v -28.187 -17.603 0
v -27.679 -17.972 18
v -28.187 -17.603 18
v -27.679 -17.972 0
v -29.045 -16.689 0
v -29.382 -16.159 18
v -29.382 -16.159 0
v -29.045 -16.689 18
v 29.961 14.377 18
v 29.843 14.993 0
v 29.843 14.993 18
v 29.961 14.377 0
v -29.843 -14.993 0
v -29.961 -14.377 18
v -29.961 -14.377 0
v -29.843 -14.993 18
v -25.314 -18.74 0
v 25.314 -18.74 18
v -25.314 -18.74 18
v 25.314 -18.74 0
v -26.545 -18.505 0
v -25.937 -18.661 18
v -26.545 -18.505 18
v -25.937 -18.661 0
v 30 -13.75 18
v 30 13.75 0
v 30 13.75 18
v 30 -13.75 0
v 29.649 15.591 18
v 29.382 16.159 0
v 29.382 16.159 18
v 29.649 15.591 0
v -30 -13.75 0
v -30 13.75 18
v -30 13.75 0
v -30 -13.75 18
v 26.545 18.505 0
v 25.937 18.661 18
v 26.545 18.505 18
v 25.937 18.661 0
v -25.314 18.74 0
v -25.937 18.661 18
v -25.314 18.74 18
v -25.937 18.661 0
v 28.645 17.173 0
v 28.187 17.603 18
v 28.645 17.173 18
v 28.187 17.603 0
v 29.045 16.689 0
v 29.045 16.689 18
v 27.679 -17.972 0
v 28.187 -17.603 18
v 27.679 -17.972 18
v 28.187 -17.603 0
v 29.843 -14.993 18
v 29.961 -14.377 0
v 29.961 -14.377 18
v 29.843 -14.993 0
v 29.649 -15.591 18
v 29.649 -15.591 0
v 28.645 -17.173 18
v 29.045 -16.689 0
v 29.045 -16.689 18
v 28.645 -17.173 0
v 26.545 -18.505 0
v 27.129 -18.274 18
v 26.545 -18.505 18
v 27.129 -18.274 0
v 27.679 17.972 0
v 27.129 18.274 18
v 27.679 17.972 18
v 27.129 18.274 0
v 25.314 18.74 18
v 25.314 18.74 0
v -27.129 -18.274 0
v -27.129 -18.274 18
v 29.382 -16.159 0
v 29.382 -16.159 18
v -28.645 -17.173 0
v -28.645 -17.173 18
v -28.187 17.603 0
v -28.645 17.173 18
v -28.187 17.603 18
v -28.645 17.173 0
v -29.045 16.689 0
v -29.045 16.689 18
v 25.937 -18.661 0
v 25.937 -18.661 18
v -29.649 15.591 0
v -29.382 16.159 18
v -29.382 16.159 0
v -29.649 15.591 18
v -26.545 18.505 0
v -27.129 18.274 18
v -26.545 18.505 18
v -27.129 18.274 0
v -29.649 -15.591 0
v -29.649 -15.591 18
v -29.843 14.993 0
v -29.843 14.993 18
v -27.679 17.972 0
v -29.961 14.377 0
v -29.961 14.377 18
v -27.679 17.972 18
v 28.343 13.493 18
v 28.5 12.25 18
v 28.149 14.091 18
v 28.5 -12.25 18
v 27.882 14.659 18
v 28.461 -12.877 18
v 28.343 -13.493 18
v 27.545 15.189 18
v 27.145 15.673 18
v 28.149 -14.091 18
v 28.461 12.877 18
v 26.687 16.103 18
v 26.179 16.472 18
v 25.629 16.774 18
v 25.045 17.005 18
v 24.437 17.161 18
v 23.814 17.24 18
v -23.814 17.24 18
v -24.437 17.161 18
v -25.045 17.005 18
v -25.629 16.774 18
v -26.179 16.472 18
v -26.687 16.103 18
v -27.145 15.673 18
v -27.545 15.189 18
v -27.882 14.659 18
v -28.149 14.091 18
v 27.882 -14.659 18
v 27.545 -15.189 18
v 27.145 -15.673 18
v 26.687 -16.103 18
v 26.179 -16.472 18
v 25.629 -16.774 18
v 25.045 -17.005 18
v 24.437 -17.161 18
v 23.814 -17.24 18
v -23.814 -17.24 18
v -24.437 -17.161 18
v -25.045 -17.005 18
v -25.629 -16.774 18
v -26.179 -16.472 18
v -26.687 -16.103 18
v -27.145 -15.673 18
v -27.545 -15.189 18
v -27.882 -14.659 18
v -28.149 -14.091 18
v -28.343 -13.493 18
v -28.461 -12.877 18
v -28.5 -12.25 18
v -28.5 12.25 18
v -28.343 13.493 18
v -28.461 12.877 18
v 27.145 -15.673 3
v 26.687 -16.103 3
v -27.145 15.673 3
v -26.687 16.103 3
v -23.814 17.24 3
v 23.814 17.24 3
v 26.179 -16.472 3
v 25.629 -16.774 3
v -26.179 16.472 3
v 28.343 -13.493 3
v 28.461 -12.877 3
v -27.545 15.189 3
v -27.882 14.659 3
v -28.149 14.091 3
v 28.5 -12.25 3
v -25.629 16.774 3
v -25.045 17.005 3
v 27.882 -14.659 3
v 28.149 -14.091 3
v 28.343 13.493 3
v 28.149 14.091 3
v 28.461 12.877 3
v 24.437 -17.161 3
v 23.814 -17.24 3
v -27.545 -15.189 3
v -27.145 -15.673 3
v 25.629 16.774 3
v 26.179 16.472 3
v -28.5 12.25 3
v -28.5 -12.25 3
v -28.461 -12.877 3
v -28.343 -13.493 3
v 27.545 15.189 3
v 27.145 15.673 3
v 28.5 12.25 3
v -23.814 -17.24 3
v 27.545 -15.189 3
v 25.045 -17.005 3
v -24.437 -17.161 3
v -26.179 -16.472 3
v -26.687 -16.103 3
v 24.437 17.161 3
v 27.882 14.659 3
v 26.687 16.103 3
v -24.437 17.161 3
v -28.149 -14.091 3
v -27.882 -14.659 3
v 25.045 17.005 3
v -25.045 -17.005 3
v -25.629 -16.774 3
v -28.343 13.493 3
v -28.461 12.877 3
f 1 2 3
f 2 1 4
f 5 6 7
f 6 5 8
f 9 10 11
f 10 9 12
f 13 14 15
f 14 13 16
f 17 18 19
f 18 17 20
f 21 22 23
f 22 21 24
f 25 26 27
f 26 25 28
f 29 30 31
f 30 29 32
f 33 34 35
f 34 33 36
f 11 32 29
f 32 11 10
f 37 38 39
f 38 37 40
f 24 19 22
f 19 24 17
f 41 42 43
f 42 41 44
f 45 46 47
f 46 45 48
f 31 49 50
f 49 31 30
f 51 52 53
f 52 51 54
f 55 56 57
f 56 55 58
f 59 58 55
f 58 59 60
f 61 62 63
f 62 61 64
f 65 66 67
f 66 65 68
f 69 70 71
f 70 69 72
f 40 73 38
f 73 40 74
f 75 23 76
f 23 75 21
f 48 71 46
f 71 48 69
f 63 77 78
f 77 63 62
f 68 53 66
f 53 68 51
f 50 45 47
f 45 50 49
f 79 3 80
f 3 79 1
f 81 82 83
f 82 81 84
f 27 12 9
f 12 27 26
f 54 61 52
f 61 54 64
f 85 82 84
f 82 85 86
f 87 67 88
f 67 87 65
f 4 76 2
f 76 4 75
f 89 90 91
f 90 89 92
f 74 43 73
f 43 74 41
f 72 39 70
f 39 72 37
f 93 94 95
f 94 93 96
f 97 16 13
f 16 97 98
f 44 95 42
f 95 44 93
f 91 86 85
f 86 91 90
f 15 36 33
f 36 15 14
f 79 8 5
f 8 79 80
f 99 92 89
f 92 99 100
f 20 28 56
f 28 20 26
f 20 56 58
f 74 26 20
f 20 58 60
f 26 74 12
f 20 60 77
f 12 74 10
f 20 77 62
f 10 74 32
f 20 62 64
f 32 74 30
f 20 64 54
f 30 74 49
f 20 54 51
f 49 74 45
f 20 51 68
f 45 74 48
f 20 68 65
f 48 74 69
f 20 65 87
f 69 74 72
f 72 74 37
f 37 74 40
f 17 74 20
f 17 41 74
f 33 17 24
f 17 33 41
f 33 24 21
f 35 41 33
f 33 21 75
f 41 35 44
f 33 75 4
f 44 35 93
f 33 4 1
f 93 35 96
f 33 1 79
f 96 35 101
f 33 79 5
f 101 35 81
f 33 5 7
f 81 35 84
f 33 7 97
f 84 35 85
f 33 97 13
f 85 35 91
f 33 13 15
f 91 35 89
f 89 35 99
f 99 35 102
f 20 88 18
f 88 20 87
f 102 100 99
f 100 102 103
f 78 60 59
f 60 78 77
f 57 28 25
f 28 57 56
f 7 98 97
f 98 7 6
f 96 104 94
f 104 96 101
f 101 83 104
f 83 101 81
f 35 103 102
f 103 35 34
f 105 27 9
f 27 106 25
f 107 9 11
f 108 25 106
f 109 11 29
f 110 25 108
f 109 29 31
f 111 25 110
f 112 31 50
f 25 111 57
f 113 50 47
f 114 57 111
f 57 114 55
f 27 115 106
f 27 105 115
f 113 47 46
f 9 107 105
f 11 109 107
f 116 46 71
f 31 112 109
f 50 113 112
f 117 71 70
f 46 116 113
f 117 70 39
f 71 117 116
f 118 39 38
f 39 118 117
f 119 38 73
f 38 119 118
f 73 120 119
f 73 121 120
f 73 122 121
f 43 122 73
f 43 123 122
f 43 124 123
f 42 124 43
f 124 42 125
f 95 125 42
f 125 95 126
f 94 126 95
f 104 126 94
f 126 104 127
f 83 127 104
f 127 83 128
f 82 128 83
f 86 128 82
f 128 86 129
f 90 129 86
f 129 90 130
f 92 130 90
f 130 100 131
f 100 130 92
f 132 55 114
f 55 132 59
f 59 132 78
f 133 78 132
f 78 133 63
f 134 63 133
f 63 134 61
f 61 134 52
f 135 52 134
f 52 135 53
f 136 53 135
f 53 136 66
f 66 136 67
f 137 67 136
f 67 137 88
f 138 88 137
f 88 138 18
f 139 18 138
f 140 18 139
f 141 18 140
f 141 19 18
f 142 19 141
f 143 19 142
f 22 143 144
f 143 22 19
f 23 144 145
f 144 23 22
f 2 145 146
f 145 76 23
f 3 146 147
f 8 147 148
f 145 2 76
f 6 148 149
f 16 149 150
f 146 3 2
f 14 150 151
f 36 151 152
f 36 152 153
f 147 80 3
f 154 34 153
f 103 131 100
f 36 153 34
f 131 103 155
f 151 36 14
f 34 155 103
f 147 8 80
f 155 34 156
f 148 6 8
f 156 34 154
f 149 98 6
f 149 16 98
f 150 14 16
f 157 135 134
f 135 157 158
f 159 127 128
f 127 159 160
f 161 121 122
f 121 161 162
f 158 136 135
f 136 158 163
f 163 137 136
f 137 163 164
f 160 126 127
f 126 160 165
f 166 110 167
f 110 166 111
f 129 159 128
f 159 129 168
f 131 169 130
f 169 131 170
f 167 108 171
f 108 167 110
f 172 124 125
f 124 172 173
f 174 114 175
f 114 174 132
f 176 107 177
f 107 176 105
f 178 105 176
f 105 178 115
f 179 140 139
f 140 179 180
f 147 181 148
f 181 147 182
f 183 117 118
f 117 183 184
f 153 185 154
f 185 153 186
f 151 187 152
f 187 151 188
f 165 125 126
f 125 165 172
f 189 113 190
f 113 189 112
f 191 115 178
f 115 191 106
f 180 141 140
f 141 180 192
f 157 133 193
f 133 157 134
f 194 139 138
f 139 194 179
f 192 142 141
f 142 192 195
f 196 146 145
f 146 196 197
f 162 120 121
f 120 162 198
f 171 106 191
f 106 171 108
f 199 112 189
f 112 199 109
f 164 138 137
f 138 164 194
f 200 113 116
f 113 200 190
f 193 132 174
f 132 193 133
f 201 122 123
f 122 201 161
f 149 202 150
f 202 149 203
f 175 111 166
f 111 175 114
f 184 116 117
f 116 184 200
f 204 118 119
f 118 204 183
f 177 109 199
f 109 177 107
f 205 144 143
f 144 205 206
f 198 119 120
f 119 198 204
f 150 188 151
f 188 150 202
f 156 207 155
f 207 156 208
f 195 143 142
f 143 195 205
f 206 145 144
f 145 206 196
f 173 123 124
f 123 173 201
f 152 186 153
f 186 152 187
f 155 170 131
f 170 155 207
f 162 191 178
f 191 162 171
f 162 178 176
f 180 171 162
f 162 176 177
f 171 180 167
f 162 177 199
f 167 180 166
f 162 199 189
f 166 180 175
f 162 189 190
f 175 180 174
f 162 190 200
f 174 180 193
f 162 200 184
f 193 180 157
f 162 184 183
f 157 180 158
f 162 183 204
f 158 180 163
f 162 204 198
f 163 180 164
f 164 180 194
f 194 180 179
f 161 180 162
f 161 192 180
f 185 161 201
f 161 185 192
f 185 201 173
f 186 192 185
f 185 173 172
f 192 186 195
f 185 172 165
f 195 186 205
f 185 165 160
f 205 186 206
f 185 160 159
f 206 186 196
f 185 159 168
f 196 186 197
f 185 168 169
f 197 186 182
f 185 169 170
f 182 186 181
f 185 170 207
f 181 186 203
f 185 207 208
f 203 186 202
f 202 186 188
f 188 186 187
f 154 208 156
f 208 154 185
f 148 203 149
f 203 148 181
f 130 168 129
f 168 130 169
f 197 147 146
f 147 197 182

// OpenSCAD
$fn = 50;


difference() {
	union() {
		hull() {
			translate(v = [-25.0000000000, 13.7500000000, 0]) {
				cylinder(h = 18, r = 5);
			}
			translate(v = [25.0000000000, 13.7500000000, 0]) {
				cylinder(h = 18, r = 5);
			}
			translate(v = [-25.0000000000, -13.7500000000, 0]) {
				cylinder(h = 18, r = 5);
			}
			translate(v = [25.0000000000, -13.7500000000, 0]) {
				cylinder(h = 18, r = 5);
			}
		}
	}
	union() {
		translate(v = [0, 0, 3]) {
			#hull() {
				translate(v = [-23.5000000000, 12.2500000000, 0]) {
					cylinder(h = 15, r = 5);
				}
				translate(v = [23.5000000000, 12.2500000000, 0]) {
					cylinder(h = 15, r = 5);
				}
				translate(v = [-23.5000000000, -12.2500000000, 0]) {
					cylinder(h = 15, r = 5);
				}
				translate(v = [23.5000000000, -12.2500000000, 0]) {
					cylinder(h = 15, r = 5);
				}
			}
		}
	}
}
